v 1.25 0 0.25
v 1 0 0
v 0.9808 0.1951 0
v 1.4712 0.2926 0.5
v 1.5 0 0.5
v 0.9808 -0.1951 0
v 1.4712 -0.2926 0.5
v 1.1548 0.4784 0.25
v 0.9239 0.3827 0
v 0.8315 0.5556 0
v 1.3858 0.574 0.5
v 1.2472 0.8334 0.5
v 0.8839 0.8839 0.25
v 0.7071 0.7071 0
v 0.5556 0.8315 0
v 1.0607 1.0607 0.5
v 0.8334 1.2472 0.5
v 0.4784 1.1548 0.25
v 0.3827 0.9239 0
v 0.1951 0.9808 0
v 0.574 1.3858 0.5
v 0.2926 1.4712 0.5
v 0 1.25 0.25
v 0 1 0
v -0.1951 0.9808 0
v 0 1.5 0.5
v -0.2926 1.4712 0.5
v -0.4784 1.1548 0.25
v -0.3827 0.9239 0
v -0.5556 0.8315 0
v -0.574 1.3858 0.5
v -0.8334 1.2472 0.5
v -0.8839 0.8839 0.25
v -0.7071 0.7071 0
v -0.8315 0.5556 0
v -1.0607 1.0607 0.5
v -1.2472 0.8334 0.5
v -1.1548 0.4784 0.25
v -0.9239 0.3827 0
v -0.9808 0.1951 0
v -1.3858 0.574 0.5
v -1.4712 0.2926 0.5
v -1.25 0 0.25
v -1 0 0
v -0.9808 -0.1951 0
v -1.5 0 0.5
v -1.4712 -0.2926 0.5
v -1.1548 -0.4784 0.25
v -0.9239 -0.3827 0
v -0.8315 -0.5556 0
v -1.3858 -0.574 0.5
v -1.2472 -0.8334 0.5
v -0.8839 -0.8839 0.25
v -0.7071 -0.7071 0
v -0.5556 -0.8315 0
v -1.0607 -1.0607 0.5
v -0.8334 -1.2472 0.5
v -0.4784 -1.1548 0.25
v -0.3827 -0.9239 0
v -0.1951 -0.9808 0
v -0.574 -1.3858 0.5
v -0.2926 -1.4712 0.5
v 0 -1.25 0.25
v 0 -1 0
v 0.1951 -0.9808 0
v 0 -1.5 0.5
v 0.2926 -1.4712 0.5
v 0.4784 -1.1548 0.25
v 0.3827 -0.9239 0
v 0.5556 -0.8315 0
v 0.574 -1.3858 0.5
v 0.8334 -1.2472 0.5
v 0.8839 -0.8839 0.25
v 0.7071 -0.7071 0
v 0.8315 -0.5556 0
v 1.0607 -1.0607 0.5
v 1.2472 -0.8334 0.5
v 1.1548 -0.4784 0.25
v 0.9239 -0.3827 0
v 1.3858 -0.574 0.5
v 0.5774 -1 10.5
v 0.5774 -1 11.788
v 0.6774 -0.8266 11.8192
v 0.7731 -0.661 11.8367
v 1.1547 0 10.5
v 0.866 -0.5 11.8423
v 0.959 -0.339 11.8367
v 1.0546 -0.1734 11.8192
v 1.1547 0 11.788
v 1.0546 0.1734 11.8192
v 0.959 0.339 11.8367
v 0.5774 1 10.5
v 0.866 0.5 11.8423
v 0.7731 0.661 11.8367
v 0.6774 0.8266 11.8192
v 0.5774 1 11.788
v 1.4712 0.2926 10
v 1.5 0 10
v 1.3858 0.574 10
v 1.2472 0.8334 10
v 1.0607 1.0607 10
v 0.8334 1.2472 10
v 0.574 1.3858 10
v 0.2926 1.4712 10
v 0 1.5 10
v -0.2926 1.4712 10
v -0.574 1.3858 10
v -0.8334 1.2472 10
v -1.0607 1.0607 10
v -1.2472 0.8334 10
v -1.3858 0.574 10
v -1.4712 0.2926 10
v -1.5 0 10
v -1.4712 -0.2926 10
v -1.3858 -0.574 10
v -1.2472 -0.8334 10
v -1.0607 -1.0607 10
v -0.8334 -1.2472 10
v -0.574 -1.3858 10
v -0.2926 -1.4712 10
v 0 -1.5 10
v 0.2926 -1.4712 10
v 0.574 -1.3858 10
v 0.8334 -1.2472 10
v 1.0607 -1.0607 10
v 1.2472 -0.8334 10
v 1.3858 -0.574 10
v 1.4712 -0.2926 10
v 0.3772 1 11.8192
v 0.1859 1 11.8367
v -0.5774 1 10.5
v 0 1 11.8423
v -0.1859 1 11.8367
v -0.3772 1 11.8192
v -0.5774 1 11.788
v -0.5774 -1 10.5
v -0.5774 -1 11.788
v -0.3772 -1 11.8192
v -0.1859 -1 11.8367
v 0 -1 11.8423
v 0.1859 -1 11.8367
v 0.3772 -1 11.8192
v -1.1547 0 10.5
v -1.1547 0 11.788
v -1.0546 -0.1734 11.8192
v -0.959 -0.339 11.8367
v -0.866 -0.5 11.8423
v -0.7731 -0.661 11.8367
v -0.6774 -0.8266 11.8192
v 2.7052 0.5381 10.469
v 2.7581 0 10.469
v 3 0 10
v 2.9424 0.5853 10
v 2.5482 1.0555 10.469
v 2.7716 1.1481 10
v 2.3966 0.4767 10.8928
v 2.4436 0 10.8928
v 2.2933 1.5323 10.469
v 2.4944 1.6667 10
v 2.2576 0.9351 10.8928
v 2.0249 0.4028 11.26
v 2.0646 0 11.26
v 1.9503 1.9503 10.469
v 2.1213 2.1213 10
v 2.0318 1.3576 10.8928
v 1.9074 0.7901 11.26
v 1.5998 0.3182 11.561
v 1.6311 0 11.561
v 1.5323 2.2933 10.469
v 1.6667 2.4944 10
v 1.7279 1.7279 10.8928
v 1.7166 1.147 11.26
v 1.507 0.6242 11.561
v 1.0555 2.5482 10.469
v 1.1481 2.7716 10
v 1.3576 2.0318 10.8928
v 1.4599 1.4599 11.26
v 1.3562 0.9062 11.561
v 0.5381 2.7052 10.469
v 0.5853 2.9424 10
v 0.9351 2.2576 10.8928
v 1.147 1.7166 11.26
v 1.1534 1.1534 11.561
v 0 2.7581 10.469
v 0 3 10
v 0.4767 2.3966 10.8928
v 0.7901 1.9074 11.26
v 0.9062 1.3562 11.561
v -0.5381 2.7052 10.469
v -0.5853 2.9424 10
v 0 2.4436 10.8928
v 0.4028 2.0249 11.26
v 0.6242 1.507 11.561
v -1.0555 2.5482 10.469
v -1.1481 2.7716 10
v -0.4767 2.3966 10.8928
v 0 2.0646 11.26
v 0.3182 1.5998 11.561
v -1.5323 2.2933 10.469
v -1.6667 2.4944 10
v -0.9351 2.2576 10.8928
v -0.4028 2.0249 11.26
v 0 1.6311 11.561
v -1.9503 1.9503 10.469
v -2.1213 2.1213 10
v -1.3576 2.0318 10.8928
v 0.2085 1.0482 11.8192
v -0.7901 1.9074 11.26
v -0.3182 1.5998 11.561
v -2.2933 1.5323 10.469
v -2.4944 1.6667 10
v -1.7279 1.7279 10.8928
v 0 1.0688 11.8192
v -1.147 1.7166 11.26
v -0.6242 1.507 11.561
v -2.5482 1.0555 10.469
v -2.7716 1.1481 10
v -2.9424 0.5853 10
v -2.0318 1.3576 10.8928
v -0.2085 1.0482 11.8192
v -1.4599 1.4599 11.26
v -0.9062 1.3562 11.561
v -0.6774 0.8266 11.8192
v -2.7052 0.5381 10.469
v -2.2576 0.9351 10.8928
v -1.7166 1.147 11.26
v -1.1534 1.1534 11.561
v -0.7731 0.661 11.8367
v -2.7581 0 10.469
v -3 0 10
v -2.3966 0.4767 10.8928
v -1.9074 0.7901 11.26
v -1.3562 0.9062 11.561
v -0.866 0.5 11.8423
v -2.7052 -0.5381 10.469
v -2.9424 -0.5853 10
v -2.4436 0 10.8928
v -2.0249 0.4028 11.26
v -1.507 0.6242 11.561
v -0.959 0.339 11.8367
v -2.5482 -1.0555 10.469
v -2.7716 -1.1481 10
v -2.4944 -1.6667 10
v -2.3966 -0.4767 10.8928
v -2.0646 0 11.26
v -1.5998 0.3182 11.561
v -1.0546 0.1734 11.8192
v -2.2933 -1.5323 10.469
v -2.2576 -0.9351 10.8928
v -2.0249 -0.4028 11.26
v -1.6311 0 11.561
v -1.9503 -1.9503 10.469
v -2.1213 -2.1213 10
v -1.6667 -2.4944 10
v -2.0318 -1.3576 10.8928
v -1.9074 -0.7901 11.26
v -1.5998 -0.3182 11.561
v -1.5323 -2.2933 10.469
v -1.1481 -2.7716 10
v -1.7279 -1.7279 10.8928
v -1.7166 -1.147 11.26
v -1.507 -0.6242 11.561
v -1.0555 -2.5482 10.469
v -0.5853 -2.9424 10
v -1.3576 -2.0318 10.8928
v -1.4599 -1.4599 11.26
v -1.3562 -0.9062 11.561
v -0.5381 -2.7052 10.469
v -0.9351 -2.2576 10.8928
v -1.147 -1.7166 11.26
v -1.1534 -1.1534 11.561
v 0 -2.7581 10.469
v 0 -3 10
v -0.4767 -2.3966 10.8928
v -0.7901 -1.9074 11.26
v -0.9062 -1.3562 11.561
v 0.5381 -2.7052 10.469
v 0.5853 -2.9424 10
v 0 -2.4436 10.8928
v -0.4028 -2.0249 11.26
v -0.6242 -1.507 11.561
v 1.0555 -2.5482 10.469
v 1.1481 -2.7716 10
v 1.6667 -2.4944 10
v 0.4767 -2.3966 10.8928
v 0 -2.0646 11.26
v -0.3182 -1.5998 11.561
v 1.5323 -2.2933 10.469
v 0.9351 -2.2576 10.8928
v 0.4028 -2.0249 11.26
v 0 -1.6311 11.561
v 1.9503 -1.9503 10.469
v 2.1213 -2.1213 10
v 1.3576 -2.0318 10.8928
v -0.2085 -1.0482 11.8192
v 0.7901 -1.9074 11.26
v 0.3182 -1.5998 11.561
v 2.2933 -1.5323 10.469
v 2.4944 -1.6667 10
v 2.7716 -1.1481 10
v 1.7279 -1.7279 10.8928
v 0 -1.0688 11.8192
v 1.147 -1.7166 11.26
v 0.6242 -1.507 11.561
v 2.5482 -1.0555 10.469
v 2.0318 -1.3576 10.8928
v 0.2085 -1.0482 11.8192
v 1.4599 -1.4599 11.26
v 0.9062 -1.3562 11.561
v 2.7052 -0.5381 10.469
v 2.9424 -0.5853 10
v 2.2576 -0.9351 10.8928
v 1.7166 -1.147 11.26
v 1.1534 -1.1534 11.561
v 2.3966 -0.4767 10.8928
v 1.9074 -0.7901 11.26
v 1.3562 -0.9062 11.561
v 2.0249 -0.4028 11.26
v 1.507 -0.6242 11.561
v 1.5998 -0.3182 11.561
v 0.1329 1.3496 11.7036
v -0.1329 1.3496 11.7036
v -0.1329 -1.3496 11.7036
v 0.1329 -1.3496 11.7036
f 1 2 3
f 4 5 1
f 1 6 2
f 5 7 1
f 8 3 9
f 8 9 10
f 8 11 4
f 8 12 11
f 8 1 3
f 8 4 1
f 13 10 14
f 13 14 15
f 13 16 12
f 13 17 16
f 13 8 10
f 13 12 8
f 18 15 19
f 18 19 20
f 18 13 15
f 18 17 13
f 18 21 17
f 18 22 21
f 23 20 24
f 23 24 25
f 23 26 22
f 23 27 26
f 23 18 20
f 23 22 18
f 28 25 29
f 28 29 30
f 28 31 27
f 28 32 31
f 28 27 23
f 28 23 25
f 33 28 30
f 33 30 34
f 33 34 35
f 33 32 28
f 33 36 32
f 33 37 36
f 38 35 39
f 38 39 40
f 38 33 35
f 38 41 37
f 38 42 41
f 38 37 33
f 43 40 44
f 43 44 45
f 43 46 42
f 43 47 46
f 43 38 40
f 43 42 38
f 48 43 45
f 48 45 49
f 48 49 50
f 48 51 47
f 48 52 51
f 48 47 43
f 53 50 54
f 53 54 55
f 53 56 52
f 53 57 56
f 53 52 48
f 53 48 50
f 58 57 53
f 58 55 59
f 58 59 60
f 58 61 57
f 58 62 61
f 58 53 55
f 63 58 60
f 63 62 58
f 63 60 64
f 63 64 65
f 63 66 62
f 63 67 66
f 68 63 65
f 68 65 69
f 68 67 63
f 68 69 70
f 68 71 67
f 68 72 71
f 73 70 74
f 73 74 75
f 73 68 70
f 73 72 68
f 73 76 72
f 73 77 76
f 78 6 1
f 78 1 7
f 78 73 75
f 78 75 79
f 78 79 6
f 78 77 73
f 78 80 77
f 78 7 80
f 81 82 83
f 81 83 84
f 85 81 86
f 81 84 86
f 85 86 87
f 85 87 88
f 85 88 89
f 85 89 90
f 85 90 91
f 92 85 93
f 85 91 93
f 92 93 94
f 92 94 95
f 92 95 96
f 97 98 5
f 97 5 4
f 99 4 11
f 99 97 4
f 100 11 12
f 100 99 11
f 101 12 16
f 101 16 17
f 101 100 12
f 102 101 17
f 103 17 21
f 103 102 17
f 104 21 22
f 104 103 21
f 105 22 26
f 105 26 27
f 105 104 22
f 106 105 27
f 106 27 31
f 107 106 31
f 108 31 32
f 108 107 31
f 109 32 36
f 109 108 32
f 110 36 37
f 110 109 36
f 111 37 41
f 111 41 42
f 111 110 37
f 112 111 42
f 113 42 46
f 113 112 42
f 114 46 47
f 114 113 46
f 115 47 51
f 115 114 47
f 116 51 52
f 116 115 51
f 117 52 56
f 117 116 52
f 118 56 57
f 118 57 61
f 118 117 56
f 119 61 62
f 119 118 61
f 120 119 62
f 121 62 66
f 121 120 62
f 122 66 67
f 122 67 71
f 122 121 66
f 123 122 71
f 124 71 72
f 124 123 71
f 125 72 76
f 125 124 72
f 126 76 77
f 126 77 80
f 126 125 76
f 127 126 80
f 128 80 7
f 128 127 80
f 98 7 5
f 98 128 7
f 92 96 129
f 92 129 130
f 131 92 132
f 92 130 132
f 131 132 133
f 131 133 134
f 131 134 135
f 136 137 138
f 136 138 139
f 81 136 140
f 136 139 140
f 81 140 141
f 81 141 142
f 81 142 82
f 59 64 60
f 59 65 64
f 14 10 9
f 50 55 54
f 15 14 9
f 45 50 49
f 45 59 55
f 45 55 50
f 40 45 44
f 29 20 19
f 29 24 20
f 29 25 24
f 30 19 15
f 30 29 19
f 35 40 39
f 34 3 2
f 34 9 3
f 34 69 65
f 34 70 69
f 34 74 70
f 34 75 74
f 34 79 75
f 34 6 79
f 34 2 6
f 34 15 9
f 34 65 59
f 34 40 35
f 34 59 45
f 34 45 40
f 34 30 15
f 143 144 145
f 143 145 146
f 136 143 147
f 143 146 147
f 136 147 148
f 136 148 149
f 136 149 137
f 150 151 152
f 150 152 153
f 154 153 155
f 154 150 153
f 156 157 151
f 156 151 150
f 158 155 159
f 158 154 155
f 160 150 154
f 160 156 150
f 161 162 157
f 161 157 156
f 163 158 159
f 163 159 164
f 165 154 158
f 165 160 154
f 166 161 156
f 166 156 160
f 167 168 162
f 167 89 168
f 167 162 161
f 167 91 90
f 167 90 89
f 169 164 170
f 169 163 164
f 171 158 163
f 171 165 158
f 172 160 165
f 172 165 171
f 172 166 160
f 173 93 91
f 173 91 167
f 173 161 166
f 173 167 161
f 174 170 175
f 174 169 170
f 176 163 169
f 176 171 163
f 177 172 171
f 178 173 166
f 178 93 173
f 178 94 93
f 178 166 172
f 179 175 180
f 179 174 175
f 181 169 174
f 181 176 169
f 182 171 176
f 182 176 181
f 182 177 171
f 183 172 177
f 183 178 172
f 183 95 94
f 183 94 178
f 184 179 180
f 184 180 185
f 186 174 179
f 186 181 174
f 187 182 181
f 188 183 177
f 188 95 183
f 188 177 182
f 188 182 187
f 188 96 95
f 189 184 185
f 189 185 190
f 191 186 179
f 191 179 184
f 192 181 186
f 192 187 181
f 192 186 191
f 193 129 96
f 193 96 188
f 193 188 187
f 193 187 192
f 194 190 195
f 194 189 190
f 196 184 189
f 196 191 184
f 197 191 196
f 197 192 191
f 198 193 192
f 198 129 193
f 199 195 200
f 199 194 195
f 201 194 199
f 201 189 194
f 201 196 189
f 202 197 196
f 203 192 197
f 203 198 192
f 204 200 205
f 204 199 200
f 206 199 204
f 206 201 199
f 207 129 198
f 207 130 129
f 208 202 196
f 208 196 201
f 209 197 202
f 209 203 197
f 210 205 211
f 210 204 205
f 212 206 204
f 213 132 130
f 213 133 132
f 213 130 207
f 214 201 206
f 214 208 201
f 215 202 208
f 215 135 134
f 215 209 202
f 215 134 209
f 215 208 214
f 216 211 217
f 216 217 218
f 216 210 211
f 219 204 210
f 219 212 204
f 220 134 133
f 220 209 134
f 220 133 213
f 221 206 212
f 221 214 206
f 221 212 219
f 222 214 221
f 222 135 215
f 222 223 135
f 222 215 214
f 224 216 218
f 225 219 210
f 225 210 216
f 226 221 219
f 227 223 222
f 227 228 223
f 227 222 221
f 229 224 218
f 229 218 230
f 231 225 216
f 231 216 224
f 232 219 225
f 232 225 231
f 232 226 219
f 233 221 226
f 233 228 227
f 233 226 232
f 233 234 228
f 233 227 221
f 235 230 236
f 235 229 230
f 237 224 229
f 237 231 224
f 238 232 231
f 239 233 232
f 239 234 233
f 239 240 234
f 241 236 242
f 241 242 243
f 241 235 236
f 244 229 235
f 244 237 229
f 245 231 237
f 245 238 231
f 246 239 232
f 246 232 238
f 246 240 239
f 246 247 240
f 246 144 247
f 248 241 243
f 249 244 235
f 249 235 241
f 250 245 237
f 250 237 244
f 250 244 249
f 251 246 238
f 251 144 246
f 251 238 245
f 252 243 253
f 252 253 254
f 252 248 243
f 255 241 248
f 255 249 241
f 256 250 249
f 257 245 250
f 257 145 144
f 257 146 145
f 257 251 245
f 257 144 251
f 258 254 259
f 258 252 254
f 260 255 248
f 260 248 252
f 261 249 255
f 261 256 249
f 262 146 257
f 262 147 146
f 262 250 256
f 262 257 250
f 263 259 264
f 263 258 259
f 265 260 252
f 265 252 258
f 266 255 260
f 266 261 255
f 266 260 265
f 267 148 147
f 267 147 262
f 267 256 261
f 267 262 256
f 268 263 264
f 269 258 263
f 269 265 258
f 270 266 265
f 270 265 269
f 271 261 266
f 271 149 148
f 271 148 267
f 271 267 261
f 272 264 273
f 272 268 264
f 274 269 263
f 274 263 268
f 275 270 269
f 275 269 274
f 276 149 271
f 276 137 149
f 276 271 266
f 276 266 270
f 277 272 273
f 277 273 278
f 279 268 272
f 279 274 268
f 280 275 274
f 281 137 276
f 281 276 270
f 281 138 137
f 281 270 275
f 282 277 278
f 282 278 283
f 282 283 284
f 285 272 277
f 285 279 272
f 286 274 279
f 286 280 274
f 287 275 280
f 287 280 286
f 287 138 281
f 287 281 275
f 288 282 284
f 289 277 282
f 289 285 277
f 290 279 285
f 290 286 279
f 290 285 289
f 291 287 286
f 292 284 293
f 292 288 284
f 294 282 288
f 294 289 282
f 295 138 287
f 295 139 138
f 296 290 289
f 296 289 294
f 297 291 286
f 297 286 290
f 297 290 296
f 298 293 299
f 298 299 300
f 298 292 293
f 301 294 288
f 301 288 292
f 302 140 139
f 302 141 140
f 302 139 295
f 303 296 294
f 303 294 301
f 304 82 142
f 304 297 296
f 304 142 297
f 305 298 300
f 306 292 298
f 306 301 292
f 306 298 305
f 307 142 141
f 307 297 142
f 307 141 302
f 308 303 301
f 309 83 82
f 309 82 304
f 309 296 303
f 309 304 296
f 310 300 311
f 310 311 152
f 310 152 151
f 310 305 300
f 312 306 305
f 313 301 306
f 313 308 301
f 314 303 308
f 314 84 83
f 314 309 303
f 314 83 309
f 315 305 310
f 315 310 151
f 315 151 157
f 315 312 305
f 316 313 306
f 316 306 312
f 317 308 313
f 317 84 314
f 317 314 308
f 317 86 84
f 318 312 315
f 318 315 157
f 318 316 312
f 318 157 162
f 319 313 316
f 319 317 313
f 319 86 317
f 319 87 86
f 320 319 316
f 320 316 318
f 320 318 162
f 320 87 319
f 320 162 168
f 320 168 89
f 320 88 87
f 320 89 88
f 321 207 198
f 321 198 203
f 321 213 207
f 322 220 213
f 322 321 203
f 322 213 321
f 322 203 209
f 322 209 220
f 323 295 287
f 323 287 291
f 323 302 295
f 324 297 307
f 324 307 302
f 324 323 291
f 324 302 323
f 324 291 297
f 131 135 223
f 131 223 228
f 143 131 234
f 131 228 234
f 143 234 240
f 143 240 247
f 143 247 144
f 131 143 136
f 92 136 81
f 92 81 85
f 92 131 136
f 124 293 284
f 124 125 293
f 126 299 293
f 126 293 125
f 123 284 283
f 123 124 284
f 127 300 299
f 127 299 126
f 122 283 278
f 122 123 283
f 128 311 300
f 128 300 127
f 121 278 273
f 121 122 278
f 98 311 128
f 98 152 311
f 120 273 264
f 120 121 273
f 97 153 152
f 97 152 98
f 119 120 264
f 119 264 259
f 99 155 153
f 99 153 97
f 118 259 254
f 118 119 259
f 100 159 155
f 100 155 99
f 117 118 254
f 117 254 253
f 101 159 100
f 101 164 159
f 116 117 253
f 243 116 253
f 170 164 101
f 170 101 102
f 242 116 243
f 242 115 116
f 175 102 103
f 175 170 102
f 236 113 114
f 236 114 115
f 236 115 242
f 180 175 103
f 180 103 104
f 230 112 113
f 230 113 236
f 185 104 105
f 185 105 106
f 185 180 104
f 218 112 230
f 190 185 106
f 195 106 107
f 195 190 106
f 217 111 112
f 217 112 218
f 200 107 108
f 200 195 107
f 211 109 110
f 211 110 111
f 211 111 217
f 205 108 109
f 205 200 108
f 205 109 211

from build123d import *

# Parameters (mm, degrees)
F2_SIZE  = 0.5
F5_DEPTH = 1.5


with BuildPart() as f1:
    # F0 (on Front) → F1 (revolve)
    with BuildSketch(Plane.XZ):
        with BuildLine():
            Line((0, 12), (0, 0))
            Line((0, 0), (1.5, 0))
            Line((1.5, 0), (1.5, 10))
            Line((1.5, 10), (3, 10))
            ThreePointArc((3, 10), (1.802776, 11.454163), (0, 12))
        make_face()
    revolve(axis=Axis((0, 0, 6), (0, 0, 1)))

    # F2
    f2_edges = [f1.edges().sort_by_distance(p)[0] for p in [
        (-1.5, 0, 0),
    ]]
    chamfer(f2_edges, length=F2_SIZE)

    # F4 (on offset) → F5 (cut)
    with BuildSketch(Plane.XY.offset(12)):
        Polygon((0.57735, 1), (-0.57735, 1), (-1.154701, 0), (-0.57735, -1), (0.57735, -1), (1.154701, 0), align=None)
    extrude(amount=-F5_DEPTH, mode=Mode.SUBTRACT)


solid = f1.part
